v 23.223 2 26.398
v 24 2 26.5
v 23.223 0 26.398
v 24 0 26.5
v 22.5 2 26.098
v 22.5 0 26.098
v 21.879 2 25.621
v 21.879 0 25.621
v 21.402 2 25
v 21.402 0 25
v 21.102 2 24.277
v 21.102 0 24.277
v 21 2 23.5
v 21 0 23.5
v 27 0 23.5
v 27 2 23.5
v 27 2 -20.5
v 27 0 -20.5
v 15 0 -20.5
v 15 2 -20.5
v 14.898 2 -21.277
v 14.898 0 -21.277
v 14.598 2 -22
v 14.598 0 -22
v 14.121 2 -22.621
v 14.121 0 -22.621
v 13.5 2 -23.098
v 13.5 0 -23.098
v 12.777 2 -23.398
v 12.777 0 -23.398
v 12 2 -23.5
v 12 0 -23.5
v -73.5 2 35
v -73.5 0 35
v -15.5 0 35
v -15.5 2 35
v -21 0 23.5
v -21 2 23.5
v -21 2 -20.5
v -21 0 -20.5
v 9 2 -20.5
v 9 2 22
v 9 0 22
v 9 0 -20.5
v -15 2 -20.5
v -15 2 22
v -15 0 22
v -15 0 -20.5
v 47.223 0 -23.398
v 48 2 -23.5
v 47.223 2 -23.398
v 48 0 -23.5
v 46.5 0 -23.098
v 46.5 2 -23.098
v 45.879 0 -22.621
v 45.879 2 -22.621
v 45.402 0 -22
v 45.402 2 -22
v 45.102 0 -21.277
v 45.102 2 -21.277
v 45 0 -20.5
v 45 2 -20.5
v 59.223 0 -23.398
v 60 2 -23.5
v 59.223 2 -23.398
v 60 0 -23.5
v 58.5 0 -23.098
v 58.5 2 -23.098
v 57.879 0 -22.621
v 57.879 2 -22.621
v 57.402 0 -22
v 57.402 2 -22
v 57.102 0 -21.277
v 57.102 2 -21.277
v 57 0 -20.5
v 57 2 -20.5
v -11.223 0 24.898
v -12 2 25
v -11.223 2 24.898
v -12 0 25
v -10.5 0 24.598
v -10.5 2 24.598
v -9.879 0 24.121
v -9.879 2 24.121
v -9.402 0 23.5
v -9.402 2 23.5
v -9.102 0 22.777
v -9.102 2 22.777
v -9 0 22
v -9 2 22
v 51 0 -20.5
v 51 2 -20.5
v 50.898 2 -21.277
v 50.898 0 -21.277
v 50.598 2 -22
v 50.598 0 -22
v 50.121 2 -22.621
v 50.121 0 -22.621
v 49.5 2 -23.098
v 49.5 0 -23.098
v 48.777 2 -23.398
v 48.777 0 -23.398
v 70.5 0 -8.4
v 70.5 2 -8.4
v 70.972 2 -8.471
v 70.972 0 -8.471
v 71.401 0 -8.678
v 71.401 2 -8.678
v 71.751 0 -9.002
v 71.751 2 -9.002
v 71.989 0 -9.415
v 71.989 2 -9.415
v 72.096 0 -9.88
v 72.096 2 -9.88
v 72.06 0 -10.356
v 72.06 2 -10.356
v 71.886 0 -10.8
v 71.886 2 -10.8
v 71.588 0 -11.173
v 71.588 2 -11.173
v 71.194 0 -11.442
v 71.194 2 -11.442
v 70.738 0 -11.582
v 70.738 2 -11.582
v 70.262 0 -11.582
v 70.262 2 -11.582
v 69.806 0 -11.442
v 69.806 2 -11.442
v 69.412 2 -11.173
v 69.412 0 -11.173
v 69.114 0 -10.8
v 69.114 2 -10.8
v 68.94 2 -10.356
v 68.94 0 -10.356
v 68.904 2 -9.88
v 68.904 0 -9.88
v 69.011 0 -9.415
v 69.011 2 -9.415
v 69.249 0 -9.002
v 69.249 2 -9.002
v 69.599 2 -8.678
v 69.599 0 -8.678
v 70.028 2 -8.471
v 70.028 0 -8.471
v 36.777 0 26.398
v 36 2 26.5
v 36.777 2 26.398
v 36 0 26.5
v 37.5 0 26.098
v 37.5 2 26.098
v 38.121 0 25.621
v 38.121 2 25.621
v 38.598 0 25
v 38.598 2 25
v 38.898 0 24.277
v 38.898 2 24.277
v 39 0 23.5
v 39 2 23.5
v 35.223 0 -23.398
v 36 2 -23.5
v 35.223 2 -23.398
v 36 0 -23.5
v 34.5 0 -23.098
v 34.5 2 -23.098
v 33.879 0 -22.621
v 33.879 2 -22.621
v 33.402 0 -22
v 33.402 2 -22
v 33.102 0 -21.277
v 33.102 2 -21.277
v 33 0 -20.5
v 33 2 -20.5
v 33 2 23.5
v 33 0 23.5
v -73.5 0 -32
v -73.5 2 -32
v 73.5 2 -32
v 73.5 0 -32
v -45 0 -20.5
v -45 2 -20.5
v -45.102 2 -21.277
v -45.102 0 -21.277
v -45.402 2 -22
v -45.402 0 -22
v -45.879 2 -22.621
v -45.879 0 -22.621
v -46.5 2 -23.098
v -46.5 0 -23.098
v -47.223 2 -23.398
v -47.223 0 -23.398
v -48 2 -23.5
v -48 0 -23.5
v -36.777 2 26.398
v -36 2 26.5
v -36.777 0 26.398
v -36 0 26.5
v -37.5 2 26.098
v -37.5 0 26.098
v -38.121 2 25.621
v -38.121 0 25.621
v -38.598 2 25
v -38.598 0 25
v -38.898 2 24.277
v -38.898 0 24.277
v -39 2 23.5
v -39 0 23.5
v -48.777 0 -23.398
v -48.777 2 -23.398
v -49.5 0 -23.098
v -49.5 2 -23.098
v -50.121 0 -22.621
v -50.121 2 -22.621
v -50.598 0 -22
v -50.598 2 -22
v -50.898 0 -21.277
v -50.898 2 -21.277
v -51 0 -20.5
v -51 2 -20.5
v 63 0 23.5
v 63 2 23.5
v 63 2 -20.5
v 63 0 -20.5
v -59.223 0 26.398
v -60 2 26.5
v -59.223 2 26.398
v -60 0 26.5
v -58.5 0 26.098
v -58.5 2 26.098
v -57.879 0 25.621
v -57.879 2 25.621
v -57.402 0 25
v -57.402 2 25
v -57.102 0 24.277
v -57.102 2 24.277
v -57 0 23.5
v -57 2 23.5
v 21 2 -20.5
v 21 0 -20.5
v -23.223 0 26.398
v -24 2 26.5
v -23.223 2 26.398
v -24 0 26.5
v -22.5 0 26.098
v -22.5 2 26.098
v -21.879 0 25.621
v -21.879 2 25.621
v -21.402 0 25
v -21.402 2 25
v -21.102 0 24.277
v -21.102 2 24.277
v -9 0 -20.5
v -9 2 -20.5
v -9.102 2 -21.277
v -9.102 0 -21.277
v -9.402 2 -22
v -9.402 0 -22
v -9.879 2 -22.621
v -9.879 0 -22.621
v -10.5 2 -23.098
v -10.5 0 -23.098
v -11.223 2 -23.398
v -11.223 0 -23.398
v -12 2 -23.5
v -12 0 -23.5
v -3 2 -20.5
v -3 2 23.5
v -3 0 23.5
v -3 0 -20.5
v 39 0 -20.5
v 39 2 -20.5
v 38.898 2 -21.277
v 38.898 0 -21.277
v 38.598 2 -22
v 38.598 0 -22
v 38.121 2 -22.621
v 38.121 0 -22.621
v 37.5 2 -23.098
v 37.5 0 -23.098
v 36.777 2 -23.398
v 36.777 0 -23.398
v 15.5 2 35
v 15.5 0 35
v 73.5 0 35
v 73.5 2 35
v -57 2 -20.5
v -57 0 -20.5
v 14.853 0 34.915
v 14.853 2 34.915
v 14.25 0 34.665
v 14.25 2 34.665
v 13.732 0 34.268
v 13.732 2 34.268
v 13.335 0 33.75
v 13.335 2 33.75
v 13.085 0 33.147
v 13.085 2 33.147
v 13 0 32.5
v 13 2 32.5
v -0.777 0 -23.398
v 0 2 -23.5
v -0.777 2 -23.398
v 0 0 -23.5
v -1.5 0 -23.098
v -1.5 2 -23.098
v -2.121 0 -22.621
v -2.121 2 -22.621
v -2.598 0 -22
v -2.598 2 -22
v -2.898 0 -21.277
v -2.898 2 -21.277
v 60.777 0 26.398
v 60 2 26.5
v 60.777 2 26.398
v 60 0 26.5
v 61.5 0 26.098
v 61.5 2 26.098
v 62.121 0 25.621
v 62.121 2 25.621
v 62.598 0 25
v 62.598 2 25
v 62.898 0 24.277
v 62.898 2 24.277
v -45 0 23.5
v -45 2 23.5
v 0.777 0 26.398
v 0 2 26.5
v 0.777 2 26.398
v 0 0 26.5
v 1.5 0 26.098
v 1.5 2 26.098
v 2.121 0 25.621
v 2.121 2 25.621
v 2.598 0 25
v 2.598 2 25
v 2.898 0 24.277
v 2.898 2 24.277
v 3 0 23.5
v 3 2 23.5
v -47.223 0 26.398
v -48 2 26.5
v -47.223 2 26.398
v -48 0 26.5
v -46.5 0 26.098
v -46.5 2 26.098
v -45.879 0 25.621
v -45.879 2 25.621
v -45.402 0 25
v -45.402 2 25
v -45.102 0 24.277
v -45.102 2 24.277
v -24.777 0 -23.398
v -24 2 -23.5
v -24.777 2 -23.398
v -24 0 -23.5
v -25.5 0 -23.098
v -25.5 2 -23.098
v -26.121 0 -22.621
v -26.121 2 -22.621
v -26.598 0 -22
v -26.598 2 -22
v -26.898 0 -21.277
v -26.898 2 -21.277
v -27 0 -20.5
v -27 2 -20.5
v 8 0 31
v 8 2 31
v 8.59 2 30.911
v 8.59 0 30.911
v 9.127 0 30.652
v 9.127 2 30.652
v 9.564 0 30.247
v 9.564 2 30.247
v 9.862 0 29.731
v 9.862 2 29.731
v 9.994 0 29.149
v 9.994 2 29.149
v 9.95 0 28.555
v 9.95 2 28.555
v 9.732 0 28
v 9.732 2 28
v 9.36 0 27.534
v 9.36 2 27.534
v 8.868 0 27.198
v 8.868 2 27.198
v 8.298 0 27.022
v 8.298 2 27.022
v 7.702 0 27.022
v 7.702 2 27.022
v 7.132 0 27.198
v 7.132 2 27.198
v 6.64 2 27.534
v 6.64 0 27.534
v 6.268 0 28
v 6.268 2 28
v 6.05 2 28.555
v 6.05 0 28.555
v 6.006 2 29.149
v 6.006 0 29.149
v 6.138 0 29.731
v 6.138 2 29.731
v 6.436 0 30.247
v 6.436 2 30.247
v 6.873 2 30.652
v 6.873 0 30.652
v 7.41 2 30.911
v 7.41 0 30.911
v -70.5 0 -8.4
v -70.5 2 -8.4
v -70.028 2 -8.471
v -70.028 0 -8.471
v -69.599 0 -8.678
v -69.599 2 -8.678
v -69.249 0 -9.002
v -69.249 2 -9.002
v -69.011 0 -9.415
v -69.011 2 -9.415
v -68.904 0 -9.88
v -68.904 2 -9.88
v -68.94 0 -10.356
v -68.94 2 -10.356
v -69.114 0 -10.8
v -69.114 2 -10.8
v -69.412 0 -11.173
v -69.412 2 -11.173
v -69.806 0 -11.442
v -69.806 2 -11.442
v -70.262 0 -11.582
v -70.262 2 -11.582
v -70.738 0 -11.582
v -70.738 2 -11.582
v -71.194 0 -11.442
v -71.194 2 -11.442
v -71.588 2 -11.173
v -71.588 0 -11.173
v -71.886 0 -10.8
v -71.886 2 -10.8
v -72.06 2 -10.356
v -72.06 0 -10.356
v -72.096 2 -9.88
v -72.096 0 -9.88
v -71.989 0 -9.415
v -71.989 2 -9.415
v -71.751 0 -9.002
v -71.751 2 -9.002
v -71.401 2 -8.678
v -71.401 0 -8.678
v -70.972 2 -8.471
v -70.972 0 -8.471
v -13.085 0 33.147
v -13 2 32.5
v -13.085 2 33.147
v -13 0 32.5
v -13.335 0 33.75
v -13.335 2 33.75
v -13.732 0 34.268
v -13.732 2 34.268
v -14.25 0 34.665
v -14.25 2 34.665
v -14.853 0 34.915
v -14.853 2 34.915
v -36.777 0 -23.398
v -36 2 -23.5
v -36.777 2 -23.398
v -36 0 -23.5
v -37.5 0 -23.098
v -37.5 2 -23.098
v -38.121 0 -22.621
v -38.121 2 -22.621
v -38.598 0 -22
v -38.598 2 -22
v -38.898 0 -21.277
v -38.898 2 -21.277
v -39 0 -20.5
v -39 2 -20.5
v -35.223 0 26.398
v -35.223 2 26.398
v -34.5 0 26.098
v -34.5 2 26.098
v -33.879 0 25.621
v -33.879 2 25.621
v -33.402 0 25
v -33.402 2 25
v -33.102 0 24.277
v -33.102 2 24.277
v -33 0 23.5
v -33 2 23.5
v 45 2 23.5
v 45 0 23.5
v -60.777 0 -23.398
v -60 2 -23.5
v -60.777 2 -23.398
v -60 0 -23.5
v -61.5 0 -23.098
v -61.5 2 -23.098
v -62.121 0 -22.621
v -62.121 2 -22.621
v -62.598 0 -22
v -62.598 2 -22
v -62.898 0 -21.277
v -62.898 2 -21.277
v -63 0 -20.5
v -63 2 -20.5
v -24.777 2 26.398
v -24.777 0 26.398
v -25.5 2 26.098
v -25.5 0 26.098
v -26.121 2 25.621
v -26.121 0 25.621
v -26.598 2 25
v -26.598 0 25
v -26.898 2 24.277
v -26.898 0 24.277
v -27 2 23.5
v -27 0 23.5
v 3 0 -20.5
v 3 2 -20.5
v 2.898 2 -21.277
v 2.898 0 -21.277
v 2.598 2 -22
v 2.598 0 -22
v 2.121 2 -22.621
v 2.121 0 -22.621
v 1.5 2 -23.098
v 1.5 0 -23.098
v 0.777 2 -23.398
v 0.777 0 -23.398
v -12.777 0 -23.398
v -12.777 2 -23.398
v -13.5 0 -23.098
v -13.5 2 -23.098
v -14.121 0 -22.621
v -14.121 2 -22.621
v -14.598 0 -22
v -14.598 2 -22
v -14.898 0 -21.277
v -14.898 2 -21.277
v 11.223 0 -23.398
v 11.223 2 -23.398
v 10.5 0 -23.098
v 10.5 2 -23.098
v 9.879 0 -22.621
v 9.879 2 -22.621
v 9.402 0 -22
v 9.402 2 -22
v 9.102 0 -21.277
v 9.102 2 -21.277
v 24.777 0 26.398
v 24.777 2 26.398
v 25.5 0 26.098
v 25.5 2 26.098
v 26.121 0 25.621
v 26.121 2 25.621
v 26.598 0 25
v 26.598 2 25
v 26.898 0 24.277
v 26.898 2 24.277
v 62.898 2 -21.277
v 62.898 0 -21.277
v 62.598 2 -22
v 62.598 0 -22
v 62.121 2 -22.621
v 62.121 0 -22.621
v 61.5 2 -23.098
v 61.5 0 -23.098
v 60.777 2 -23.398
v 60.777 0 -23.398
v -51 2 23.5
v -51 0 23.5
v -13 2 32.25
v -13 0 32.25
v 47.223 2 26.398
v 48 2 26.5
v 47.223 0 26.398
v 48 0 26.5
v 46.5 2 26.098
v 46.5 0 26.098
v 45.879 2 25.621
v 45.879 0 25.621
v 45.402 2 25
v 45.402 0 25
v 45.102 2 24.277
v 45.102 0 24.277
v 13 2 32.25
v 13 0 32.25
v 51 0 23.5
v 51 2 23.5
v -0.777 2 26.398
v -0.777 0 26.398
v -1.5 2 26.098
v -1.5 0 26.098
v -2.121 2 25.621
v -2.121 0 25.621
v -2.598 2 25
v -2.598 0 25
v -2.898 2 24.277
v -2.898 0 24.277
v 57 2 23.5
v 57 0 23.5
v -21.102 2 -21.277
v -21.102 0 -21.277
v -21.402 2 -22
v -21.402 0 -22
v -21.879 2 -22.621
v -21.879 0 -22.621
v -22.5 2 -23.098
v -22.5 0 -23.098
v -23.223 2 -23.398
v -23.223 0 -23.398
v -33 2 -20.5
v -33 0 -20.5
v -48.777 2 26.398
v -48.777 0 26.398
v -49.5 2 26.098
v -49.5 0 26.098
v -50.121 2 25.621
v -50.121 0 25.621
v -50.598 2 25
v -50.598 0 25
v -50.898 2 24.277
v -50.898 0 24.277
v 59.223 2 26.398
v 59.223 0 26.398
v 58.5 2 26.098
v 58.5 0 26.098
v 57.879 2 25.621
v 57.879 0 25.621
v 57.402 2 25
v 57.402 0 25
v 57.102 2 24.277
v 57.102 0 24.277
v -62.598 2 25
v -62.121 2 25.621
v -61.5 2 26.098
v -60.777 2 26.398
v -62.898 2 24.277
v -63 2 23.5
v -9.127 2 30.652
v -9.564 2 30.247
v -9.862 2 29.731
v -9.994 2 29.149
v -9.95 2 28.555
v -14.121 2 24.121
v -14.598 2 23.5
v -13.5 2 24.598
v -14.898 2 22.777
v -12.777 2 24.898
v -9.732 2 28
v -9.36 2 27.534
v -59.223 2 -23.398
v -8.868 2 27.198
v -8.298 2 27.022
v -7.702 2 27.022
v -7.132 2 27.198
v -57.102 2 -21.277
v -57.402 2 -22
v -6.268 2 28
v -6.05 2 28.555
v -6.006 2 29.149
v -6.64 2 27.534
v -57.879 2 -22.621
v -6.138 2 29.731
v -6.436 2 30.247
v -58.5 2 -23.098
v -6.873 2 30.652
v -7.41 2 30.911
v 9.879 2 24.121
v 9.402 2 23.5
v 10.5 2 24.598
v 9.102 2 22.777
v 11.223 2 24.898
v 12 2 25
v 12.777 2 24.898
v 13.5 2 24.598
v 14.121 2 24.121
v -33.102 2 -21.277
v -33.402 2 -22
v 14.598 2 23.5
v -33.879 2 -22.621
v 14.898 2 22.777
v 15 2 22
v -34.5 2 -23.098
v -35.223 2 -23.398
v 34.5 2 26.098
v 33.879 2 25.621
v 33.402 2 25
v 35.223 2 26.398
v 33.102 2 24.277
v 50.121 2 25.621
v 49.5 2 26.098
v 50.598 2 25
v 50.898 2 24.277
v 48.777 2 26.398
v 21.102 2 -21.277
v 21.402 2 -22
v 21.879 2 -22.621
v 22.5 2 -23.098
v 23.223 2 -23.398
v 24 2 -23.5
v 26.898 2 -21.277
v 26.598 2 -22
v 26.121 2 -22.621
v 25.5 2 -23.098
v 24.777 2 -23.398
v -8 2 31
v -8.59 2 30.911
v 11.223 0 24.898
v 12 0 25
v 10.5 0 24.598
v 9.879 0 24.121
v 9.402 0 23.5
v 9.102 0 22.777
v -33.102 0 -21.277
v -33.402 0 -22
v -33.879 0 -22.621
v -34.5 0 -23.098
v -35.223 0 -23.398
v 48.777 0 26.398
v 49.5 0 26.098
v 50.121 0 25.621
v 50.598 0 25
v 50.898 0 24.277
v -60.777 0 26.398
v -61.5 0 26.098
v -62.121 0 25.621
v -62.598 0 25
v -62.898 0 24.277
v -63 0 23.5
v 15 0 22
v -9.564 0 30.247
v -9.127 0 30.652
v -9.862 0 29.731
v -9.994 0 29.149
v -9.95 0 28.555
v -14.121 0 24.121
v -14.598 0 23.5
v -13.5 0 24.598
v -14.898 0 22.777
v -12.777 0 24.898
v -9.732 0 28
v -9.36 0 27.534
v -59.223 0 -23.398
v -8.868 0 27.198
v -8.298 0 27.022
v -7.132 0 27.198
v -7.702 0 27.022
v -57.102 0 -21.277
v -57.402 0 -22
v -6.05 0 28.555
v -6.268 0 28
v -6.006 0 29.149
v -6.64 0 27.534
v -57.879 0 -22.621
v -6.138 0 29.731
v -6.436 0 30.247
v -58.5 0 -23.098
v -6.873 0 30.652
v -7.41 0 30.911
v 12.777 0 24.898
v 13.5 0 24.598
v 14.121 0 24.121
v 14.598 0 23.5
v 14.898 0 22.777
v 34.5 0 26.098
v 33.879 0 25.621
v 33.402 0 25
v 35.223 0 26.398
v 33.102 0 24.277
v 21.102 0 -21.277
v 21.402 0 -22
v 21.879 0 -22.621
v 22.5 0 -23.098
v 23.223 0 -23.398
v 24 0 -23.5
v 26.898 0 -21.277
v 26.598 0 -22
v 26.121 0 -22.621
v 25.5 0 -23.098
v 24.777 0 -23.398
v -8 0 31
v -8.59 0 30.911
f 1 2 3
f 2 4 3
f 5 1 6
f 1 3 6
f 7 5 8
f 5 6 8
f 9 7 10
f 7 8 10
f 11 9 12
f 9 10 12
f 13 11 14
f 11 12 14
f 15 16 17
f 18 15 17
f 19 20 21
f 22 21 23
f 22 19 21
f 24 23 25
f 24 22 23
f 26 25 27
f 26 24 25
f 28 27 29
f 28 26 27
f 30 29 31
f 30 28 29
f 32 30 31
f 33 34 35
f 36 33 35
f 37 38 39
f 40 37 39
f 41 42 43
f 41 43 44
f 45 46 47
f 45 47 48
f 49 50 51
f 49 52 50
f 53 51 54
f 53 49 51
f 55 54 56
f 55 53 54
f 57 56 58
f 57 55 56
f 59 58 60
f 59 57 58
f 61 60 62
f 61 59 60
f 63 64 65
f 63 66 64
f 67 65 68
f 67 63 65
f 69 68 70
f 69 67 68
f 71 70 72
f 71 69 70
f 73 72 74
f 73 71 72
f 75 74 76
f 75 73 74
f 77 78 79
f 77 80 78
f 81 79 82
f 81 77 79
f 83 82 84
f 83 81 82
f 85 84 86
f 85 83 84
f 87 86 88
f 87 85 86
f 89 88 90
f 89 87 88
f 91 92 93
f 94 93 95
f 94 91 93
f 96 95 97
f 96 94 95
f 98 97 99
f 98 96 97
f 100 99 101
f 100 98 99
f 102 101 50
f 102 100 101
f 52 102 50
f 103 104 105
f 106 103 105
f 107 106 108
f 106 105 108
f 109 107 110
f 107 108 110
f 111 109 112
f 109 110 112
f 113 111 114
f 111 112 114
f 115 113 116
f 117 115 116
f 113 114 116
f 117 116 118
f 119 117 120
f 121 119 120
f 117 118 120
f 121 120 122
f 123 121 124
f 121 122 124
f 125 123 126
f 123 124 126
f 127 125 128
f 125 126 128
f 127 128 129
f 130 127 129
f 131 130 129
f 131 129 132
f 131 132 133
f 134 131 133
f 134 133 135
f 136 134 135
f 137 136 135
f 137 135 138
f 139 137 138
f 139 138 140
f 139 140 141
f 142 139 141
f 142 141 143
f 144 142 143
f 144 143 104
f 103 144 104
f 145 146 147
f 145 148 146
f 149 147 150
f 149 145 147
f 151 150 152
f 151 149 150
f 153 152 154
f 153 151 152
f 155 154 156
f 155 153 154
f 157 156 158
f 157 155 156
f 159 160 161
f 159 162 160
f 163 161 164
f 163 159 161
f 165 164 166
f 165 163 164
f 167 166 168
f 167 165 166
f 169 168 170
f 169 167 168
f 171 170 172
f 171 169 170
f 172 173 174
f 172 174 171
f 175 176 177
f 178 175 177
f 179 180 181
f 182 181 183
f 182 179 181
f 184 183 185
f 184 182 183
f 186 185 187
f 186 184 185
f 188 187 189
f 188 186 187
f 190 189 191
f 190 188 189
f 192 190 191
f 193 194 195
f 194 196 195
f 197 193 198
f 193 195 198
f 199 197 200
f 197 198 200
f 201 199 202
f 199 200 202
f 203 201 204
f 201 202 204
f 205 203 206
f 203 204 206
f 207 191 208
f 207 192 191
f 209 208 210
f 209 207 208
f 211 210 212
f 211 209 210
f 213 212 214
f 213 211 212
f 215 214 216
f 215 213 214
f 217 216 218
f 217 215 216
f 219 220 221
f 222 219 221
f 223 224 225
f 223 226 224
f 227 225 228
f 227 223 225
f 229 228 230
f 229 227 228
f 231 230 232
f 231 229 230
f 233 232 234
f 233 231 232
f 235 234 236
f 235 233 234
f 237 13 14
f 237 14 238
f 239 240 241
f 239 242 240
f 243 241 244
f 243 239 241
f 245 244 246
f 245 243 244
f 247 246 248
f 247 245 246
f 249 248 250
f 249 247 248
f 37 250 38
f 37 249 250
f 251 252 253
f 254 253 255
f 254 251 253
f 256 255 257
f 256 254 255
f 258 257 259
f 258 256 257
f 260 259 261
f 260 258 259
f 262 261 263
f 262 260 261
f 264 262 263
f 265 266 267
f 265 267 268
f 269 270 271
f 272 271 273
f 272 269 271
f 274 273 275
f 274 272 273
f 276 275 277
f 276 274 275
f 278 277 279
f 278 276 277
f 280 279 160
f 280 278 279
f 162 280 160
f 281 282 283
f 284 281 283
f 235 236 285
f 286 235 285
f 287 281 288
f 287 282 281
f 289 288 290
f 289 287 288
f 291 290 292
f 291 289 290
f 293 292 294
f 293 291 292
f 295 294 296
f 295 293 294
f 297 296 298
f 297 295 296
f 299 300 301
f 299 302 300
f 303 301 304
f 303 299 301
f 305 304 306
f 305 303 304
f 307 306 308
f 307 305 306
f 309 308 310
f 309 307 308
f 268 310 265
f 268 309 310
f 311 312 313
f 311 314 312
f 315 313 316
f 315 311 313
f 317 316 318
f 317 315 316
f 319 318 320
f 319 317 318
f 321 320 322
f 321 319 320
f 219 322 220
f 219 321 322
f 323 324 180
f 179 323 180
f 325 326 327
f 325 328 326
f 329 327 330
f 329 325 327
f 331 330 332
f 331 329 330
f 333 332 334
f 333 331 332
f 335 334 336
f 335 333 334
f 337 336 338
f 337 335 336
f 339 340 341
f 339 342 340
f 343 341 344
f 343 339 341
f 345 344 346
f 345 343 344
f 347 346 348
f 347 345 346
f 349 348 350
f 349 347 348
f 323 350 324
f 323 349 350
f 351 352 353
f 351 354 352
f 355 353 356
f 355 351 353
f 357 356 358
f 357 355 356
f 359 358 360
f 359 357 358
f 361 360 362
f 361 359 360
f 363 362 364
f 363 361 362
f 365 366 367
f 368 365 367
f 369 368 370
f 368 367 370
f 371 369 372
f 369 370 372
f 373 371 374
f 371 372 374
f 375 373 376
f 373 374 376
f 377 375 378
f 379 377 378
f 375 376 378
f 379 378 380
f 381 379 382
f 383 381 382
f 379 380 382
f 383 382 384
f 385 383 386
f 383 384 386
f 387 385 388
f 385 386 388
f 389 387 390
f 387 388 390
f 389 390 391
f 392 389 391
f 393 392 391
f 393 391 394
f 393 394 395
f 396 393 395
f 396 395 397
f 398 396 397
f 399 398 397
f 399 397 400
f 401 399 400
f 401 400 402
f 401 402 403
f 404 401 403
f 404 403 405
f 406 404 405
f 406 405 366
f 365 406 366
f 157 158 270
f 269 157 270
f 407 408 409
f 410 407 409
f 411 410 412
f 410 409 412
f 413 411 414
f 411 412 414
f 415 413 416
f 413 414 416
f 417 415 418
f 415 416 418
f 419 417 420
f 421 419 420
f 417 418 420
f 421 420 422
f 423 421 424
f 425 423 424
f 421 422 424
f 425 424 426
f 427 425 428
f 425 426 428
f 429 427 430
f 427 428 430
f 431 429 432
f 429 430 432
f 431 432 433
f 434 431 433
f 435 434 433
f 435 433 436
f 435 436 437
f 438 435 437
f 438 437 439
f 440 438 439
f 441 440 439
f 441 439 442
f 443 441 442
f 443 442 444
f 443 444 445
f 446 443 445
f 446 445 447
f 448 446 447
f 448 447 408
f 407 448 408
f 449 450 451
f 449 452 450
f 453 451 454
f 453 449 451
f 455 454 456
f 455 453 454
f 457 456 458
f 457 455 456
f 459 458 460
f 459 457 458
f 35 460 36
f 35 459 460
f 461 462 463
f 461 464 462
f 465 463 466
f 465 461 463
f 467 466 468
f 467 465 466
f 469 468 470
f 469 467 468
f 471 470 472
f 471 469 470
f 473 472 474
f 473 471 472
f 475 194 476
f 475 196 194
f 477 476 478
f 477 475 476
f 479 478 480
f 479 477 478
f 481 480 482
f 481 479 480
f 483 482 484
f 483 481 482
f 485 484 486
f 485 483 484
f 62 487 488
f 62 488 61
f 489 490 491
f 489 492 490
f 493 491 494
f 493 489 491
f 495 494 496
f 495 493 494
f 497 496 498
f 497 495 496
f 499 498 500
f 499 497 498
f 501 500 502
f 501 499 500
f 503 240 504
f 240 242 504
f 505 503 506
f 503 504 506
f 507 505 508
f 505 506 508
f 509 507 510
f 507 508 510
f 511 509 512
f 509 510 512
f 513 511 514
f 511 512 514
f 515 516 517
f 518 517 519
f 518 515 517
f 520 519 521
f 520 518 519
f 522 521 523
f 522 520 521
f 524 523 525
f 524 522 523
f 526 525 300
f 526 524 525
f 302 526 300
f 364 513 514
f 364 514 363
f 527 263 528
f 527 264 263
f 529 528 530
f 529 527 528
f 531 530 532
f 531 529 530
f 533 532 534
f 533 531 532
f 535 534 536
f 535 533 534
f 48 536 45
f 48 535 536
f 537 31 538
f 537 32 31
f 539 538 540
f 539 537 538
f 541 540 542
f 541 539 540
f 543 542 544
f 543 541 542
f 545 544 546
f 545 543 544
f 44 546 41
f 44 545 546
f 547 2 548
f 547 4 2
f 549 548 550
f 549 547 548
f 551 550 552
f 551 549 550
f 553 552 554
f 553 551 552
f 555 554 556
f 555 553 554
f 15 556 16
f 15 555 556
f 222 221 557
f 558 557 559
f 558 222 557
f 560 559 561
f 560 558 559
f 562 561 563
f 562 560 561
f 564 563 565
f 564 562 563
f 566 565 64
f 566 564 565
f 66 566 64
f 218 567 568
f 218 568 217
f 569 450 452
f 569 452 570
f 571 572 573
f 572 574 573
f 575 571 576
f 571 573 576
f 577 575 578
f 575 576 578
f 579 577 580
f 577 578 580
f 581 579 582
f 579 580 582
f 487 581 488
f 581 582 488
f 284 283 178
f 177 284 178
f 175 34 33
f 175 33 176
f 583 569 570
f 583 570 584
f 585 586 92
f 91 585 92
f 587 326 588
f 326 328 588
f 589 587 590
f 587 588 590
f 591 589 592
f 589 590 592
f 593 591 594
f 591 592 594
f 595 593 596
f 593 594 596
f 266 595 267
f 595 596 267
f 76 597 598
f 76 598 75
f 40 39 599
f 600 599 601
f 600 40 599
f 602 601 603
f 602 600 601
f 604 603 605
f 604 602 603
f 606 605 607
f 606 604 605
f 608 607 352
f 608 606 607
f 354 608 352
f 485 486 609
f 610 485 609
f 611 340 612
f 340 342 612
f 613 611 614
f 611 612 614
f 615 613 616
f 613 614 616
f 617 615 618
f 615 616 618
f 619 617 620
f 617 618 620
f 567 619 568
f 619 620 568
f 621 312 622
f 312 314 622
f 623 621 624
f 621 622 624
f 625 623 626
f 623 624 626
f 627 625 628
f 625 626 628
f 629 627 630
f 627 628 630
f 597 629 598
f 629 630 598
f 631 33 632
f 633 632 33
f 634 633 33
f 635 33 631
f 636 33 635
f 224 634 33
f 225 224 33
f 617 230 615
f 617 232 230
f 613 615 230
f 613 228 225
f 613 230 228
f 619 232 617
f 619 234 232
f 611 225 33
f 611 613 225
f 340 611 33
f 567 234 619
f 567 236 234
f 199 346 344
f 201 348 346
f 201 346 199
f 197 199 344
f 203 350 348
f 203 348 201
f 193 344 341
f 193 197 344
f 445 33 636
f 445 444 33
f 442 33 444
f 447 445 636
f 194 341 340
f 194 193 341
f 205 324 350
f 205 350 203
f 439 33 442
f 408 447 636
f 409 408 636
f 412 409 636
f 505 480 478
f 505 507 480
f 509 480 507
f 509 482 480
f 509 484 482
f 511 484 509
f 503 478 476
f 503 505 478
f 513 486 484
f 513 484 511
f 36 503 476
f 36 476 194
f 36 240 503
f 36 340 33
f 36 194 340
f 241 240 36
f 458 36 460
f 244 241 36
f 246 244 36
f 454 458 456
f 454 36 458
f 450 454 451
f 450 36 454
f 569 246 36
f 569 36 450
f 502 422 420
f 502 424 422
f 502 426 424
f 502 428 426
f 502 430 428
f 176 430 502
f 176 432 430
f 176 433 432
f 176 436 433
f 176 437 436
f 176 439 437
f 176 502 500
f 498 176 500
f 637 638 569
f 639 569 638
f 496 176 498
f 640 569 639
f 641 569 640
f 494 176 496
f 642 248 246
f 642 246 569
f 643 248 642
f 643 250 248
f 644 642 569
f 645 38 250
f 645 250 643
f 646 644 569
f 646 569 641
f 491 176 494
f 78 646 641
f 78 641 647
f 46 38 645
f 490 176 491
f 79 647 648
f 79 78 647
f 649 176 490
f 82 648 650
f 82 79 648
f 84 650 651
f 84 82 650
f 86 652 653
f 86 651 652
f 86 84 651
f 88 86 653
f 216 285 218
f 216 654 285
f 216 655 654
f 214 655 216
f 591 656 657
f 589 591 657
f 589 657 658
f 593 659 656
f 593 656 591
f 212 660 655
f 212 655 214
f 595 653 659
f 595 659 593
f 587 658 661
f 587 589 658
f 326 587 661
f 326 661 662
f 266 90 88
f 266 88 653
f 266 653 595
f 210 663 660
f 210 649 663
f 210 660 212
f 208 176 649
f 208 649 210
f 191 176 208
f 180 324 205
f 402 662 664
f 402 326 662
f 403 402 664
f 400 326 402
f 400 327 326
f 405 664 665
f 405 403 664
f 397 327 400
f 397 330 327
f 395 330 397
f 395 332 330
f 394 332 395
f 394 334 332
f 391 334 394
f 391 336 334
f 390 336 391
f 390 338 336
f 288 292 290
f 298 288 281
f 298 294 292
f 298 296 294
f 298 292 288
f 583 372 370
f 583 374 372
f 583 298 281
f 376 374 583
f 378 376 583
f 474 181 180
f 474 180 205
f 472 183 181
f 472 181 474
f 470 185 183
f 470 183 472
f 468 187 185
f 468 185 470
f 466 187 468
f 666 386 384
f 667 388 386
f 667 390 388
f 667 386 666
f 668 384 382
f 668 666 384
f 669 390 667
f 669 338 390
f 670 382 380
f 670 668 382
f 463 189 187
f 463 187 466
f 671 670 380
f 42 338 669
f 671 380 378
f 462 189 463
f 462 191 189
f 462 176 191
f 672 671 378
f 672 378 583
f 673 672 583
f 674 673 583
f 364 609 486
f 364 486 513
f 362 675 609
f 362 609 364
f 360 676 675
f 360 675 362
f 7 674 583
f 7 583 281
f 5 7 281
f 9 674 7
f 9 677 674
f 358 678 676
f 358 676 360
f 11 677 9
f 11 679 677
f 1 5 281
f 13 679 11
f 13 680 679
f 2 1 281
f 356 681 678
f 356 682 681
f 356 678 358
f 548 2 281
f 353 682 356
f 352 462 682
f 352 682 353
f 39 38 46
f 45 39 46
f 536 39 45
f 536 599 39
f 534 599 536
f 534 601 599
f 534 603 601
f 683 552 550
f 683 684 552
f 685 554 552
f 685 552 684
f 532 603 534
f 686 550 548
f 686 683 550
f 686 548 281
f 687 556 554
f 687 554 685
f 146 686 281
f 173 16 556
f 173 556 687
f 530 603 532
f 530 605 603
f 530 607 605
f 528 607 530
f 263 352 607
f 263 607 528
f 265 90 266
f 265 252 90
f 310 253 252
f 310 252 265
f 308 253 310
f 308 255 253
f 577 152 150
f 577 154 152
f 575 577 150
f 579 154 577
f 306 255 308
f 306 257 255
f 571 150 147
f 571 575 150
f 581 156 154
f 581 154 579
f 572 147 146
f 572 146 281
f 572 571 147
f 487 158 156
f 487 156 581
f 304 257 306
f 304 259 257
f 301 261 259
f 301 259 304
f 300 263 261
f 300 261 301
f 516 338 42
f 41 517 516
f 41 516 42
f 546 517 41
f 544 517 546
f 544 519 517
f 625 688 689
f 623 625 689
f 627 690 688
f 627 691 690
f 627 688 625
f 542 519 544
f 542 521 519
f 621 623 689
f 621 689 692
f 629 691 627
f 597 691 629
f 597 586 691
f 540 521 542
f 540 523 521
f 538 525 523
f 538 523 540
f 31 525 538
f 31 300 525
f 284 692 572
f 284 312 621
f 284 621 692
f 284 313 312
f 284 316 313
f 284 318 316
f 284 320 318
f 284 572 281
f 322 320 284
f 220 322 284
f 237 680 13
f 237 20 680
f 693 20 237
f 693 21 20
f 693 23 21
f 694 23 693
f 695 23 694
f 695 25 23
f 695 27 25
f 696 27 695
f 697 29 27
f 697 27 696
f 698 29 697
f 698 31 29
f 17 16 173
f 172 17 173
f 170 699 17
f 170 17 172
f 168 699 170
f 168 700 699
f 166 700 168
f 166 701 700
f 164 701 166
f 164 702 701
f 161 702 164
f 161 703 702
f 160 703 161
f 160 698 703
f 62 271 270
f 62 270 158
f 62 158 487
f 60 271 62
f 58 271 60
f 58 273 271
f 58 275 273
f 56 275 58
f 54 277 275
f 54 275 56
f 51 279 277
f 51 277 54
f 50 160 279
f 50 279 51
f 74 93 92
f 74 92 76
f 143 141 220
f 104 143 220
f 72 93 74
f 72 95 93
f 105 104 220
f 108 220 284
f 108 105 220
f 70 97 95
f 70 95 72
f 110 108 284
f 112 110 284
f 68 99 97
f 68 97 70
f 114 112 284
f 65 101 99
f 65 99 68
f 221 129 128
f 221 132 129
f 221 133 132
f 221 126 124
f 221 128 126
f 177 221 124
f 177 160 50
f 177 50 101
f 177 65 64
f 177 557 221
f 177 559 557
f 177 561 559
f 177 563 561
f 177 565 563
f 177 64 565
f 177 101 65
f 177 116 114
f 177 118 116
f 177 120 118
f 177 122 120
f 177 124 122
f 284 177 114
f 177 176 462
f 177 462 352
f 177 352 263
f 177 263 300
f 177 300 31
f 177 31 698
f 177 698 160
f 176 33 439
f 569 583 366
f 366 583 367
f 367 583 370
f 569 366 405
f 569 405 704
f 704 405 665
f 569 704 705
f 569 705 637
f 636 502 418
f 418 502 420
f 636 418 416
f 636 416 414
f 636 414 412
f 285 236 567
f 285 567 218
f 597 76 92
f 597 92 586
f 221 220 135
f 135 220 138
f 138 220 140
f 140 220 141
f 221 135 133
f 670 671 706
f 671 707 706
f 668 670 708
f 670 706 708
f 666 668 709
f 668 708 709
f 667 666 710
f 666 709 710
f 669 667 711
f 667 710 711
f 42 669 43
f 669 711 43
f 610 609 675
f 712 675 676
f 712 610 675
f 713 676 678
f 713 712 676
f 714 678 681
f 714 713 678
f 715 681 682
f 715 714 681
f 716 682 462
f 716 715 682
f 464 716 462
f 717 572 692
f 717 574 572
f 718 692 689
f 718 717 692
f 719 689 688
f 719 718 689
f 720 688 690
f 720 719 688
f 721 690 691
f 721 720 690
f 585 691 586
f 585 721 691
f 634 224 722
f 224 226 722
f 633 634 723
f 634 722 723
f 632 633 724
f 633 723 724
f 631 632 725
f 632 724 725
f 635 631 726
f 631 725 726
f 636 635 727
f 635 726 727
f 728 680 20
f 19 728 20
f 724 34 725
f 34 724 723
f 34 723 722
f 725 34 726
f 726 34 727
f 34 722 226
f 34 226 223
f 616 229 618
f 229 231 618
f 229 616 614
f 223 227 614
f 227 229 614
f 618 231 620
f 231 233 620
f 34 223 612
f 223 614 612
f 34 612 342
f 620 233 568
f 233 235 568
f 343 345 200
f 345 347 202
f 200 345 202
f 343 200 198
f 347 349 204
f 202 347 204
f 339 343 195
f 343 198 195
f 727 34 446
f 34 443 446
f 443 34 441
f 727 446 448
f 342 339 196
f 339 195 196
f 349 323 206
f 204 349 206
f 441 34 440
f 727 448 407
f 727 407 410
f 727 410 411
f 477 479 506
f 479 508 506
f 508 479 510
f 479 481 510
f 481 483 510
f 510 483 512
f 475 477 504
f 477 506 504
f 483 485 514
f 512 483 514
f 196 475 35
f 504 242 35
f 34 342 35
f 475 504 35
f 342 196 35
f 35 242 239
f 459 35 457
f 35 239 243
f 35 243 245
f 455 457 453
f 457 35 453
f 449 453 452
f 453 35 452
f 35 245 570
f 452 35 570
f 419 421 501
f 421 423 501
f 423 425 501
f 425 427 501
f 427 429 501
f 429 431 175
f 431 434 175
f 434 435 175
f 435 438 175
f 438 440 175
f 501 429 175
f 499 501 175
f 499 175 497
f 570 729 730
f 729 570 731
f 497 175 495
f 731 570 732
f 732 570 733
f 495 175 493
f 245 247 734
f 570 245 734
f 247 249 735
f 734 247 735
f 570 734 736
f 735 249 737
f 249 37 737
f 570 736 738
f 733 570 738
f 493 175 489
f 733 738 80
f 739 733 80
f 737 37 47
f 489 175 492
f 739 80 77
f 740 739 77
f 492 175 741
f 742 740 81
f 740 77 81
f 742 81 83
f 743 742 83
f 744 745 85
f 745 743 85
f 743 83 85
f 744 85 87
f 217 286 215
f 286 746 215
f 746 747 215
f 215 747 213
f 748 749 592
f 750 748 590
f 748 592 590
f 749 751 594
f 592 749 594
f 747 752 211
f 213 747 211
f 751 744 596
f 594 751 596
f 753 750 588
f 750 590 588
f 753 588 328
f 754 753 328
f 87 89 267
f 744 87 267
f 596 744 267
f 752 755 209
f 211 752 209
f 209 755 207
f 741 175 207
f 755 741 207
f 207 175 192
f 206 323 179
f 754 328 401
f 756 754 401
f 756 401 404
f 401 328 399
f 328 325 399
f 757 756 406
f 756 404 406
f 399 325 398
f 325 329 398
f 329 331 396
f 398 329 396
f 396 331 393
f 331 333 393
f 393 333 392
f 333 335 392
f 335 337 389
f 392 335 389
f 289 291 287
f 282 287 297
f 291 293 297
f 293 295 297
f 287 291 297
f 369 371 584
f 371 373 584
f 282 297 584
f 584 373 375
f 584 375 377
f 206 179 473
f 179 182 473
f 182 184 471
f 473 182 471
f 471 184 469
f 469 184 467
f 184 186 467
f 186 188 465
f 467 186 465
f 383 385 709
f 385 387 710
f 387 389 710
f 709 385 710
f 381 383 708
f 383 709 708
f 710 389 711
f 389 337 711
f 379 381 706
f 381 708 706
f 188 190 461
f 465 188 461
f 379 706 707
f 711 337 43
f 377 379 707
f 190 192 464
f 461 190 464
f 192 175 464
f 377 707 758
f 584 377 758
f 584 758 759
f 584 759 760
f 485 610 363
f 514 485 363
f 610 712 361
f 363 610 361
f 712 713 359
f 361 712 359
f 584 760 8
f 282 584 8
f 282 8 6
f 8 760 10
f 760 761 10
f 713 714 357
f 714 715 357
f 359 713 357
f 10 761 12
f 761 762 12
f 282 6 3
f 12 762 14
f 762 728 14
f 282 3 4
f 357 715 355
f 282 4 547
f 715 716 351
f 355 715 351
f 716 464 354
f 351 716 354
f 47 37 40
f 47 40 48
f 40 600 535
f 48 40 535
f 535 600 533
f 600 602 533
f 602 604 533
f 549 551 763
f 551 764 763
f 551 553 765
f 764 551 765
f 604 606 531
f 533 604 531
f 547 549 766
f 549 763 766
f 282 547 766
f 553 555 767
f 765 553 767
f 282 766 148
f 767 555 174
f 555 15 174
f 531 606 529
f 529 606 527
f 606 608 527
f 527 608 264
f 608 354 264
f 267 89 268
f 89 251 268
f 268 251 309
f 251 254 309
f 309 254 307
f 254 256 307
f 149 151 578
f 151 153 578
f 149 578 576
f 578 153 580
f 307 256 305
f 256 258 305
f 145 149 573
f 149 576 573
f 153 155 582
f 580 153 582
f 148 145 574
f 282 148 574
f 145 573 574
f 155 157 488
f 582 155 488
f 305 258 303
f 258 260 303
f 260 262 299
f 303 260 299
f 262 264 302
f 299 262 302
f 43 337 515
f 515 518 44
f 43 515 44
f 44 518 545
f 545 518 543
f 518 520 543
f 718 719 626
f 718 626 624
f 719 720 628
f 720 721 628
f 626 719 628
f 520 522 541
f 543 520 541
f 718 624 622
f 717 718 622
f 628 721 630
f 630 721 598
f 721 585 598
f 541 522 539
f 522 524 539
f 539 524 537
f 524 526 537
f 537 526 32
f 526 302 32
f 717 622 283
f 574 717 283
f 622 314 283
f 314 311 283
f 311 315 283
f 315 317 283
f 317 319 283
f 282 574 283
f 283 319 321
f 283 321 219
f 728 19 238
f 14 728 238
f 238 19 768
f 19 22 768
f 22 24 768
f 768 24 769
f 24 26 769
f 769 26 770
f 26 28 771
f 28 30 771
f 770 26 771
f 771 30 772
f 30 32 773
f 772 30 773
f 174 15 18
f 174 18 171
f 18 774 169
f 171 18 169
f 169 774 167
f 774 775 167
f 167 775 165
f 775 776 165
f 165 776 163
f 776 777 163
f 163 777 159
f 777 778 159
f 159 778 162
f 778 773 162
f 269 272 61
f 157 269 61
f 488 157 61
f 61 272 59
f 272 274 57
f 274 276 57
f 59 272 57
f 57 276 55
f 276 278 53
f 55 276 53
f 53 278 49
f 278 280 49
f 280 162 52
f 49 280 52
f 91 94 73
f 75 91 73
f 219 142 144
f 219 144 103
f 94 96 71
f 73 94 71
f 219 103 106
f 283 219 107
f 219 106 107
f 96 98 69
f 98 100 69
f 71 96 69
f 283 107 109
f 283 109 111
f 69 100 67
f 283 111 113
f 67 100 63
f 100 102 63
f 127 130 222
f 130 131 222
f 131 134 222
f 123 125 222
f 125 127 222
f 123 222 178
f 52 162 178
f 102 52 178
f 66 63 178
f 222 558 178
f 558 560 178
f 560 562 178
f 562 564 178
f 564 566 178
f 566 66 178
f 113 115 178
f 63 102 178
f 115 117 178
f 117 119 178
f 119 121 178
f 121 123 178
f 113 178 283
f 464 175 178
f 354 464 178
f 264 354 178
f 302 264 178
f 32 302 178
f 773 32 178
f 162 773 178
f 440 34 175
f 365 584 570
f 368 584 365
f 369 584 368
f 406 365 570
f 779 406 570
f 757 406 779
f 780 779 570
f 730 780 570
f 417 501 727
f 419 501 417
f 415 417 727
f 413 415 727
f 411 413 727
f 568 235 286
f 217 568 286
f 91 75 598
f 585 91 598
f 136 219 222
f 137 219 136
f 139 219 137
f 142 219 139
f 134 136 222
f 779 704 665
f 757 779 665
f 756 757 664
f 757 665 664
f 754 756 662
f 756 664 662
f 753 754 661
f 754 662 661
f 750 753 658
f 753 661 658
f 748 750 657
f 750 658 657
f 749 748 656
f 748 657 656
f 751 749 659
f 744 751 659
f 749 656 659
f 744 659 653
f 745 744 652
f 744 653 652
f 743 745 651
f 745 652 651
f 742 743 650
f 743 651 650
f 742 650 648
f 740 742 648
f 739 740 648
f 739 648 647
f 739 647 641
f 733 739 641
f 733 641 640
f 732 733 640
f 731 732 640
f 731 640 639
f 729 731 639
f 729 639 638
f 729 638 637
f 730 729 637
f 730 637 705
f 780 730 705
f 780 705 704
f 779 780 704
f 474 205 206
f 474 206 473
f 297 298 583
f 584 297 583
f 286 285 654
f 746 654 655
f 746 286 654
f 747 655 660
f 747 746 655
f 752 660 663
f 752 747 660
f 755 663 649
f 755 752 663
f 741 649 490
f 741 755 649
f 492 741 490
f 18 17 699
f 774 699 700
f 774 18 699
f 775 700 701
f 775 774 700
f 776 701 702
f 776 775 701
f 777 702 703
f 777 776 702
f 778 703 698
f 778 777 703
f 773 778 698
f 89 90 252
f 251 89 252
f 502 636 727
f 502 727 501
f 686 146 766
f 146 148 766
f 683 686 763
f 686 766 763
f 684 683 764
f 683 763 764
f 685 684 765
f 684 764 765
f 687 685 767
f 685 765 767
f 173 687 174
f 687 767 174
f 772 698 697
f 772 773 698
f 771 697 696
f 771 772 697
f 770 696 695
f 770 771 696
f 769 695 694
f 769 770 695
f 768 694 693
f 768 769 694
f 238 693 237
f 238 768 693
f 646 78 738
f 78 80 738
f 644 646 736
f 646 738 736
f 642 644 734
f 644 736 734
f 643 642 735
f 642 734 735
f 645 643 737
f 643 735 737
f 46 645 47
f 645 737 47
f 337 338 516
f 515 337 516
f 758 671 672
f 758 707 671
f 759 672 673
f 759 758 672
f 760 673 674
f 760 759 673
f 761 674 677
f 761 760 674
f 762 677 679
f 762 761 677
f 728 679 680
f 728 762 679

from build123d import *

# Parameters (mm, degrees)
SKETCH_1_W          = 147
SKETCH_1_H          = 70
EXTRUDE_1_DEPTH     = 2
SKETCH_3_W          = 147
SKETCH_3_H          = 3
CUT_EXTRUDE_1_DEPTH = 82.432487375
SKETCH_5_R          = 2
CUT_EXTRUDE_3_DEPTH = 10
SKETCH_6_R          = 1.6
CUT_EXTRUDE_4_DEPTH = 10
SKETCH_7_W          = 6
SKETCH_7_H          = 48.5
SKETCH_7_H_2        = 50
CUT_EXTRUDE_5_DEPTH = 10
FILLET_1_R          = 3
SKETCH_8_W          = 26
SKETCH_8_H          = 5.5
CUT_EXTRUDE_6_DEPTH = 82.432487375
FILLET_2_R          = 2.5


with BuildPart() as part:
    # 草图1 → 凸台-拉伸1 (new body)
    with BuildSketch(Plane(origin=(0, 0, 0), x_dir=(1, 0, 0), z_dir=(0, 1, 0))):
        Rectangle(SKETCH_1_W, SKETCH_1_H)
    extrude(amount=EXTRUDE_1_DEPTH)

    # 草图3 → 切除-拉伸1 (cut, through all)
    with BuildSketch(Plane(origin=(0, 2, 0), x_dir=(1, 0, 0), z_dir=(0, 1, 0))):
        with Locations((0, 33.5)):
            Rectangle(SKETCH_3_W, SKETCH_3_H)
    extrude(amount=-CUT_EXTRUDE_1_DEPTH, mode=Mode.SUBTRACT)

    # 草图5 → 切除-拉伸3 (cut)
    with BuildSketch(Plane(origin=(0, 2, 0), x_dir=(1, 0, 0), z_dir=(0, 1, 0))):
        with Locations(Location((-8, -29, 0), (0, 0, 270))):
            Circle(SKETCH_5_R)
        with Locations(Location((8, -29, 0), (0, 0, 270))):
            Circle(SKETCH_5_R)
    extrude(amount=-CUT_EXTRUDE_3_DEPTH, mode=Mode.SUBTRACT)

    # 草图6 → 切除-拉伸4 (cut)
    with BuildSketch(Plane(origin=(0, 2, 0), x_dir=(1, 0, 0), z_dir=(0, 1, 0))):
        with Locations(Location((-70.5, 10, 0), (0, 0, 270))):
            Circle(SKETCH_6_R)
        with Locations(Location((70.5, 10, 0), (0, 0, 270))):
            Circle(SKETCH_6_R)
    extrude(amount=-CUT_EXTRUDE_4_DEPTH, mode=Mode.SUBTRACT)

    # 草图7 → 切除-拉伸5 (cut)
    with BuildSketch(Plane(origin=(0, 2, 0), x_dir=(1, 0, 0), z_dir=(0, 1, 0))):
        with Locations((12, -0.75)):
            Rectangle(SKETCH_7_W, SKETCH_7_H)
        with Locations((0, -1.5)):
            Rectangle(SKETCH_7_W, SKETCH_7_H_2)
        with Locations((24, -1.5)):
            Rectangle(SKETCH_7_W, SKETCH_7_H_2)
        with Locations((36, -1.5)):
            Rectangle(SKETCH_7_W, SKETCH_7_H_2)
        with Locations((48, -1.5)):
            Rectangle(SKETCH_7_W, SKETCH_7_H_2)
        with Locations((60, -1.5)):
            Rectangle(SKETCH_7_W, SKETCH_7_H_2)
        with Locations((-12, -0.75)):
            Rectangle(SKETCH_7_W, SKETCH_7_H)
        with Locations((-24, -1.5)):
            Rectangle(SKETCH_7_W, SKETCH_7_H_2)
        with Locations((-36, -1.5)):
            Rectangle(SKETCH_7_W, SKETCH_7_H_2)
        with Locations((-48, -1.5)):
            Rectangle(SKETCH_7_W, SKETCH_7_H_2)
        with Locations((-60, -1.5)):
            Rectangle(SKETCH_7_W, SKETCH_7_H_2)
    extrude(amount=-CUT_EXTRUDE_5_DEPTH, mode=Mode.SUBTRACT)

    # 圆角1
    fillet_1_edges = [part.edges().sort_by_distance(p)[0] for p in [
        (-63, 1, -23.5),
        (-57, 1, -23.5),
        (-57, 1, 26.5),
        (-63, 1, 26.5),
        (-27, 1, -23.5),
        (-39, 1, -23.5),
        (-51, 1, -23.5),
        (-3, 1, -23.5),
        (-15, 1, -23.5),
        (9, 1, -23.5),
        (33, 1, -23.5),
        (21, 1, -23.5),
        (45, 1, -23.5),
        (57, 1, -23.5),
        (63, 1, -23.5),
        (51, 1, -23.5),
        (39, 1, -23.5),
        (27, 1, -23.5),
        (15, 1, -23.5),
        (3, 1, -23.5),
        (-9, 1, -23.5),
        (-21, 1, -23.5),
        (-33, 1, -23.5),
        (-45, 1, -23.5),
        (-45, 1, 26.5),
        (-33, 1, 26.5),
        (-21, 1, 26.5),
        (3, 1, 26.5),
        (27, 1, 26.5),
        (39, 1, 26.5),
        (51, 1, 26.5),
        (63, 1, 26.5),
        (21, 1, 26.5),
        (33, 1, 26.5),
        (45, 1, 26.5),
        (57, 1, 26.5),
        (-3, 1, 26.5),
        (-27, 1, 26.5),
        (-39, 1, 26.5),
        (-51, 1, 26.5),
        (15, 1, 25),
        (9, 1, 25),
        (-15, 1, 25),
        (-9, 1, 25),
    ]]
    fillet(fillet_1_edges, radius=FILLET_1_R - 0.0001)  # a hair under: the kernel refuses the full size

    # 草图8 → 切除-拉伸6 (cut, through all)
    with BuildSketch(Plane(origin=(0, 2, 0), x_dir=(1, 0, 0), z_dir=(0, 1, 0))):
        with Locations((0, -35)):
            Rectangle(SKETCH_8_W, SKETCH_8_H)
    extrude(amount=-CUT_EXTRUDE_6_DEPTH, mode=Mode.SUBTRACT)

    # 圆角2
    fillet_2_edges = [part.edges().sort_by_distance(p)[0] for p in [
        (13, 1, 35),
        (-13, 1, 35),
    ]]
    fillet(fillet_2_edges, radius=FILLET_2_R)


solid = part.part
